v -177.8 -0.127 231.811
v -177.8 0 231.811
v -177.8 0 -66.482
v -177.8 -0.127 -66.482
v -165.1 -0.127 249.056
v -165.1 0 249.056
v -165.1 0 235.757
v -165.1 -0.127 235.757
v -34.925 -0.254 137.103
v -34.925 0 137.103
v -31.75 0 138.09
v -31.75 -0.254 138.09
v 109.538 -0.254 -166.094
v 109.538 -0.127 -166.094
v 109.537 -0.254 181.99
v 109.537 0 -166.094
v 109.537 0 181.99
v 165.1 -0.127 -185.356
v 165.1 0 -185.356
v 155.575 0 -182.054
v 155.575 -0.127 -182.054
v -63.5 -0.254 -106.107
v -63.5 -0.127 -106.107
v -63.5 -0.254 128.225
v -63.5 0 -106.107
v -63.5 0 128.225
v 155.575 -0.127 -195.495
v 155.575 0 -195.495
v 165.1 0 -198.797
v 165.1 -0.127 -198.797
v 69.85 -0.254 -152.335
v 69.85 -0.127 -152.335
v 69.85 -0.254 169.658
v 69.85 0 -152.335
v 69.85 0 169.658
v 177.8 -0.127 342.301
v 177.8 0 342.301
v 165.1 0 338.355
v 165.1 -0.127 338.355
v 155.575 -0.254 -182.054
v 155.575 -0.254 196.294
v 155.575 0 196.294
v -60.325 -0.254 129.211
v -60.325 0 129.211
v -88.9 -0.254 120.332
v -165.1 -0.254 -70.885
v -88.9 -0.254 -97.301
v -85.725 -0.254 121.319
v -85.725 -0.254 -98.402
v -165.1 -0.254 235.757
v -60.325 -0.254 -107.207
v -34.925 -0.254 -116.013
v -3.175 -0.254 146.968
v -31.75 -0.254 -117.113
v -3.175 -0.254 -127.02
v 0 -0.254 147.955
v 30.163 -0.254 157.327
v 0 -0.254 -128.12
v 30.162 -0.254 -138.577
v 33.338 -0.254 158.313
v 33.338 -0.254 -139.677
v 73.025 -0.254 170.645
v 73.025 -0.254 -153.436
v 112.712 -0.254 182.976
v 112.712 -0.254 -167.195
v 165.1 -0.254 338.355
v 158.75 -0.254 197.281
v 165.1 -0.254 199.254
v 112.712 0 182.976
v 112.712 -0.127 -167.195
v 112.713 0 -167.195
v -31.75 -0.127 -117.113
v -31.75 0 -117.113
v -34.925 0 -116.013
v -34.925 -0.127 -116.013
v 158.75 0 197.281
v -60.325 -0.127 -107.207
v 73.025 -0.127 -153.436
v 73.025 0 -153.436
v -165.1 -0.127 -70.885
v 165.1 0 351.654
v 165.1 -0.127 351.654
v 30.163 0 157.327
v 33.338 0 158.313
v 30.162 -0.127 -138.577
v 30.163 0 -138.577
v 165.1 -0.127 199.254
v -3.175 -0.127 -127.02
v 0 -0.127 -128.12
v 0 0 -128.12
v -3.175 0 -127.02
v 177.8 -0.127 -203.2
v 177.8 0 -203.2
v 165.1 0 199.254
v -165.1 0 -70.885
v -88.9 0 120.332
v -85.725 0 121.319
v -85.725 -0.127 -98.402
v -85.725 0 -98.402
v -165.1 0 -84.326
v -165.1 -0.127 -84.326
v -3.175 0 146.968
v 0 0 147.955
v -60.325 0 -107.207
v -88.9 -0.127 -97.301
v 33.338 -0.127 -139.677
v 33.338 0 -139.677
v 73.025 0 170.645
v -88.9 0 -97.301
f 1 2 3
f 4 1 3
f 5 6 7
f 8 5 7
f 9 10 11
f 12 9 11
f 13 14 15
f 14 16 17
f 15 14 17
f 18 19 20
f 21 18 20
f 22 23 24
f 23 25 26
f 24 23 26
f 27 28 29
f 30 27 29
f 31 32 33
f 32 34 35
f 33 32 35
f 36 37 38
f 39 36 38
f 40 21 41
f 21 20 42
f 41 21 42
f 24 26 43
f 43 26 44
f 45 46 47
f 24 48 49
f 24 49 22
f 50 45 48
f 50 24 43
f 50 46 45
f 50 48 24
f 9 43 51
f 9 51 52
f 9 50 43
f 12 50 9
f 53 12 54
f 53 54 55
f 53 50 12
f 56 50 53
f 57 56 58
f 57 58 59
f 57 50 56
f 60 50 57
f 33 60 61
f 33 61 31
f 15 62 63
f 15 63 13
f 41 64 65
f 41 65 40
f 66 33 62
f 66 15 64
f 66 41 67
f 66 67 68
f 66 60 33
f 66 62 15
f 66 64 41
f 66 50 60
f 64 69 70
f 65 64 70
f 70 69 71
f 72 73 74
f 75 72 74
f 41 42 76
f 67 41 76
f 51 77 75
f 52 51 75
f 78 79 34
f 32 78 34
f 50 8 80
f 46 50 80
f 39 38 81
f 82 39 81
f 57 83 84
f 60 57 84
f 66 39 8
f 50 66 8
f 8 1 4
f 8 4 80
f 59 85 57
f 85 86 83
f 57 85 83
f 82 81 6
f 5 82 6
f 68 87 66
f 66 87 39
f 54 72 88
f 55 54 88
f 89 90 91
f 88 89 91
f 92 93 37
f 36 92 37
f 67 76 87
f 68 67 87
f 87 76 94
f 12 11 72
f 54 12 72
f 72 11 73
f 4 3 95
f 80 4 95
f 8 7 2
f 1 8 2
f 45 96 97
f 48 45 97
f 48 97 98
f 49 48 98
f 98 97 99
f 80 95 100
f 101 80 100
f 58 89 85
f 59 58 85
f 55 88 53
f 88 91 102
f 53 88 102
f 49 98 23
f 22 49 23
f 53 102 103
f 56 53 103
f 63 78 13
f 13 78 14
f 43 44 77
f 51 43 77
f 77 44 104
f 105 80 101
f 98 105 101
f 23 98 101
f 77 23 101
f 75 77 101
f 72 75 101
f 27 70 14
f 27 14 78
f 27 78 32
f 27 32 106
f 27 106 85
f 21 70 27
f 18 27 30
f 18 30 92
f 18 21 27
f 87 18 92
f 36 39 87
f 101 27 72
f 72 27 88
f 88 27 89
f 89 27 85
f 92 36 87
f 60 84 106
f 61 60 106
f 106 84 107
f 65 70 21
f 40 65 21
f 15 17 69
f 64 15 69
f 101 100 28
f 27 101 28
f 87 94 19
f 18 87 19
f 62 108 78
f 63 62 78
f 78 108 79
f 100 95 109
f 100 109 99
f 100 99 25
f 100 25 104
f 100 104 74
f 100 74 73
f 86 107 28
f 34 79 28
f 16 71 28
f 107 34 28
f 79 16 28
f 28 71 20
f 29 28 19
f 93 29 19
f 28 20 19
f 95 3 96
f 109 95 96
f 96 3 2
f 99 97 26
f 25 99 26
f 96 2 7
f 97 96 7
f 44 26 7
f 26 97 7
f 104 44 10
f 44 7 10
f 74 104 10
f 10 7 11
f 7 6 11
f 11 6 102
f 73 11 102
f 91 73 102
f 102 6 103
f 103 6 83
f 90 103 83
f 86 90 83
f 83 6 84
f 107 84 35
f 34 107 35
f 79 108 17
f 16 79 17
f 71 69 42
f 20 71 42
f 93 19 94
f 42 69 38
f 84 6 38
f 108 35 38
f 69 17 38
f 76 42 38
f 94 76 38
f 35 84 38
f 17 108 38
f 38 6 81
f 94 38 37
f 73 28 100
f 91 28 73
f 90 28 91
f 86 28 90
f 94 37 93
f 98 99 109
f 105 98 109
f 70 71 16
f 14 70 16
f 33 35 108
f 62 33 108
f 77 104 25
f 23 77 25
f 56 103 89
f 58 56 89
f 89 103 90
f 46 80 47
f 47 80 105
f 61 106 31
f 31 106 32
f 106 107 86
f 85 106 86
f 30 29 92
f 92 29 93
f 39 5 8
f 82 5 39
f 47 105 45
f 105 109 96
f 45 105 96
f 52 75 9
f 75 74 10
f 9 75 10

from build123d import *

# Parameters (mm, degrees)
F1_DEPTH = 0.254
F2_DEPTH = 0.127


with BuildPart() as f1:
    # F0 (on Front) → F1 (new body)
    with BuildSketch(Plane.XZ):
        Polygon((-165.1, 96.6560714286), (-165.1, -70.8848640166), (-88.9, -97.3012268737), (-88.9, 120.3325), align=None)
        Polygon((-85.725, 121.3190178571), (-85.725, -98.4019086594), (-63.5, -106.1066811594), (-63.5, 128.2246428571), align=None)
        Polygon((-60.325, 129.2111607143), (-60.325, -107.2073629451), (-34.925, -116.0128172308), (-34.925, 137.1033035714), align=None)
        Polygon((-31.75, 138.0898214286), (-31.75, -117.1134990166), (-3.175, -127.019635088), (-3.175, 146.9684821429), align=None)
        Polygon((0, 147.955), (0, -128.1203168737), (30.1625, -138.576793838), (30.1625, 157.3269196429), align=None)
        Polygon((33.3375, -139.6774756237), (69.85, -152.3353161594), (69.85, 169.6583928571), (33.3375, 158.3134375), align=None)
        Polygon((112.7125, -167.1945202666), (155.575, -182.0537243737), (155.575, 196.294375), (112.7125, 182.9763839286), align=None)
        Polygon((73.025, -153.4359979451), (109.5375, -166.0938384808), (109.5375, 181.9898660714), (73.025, 170.6449107143), align=None)
        Polygon((-165.1, 235.7571436628), (-165.1, 96.6560714286), (-88.9, 120.3325), (-85.725, 121.3190178571), (-63.5, 128.2246428571), (-60.325, 129.2111607143), (-34.925, 137.1033035714), (-31.75, 138.0898214286), (-3.175, 146.9684821429), (0, 147.955), (30.1625, 157.3269196429), (33.3375, 158.3134375), (69.85, 169.6583928571), (73.025, 170.6449107143), (109.5375, 181.9898660714), (112.7125, 182.9763839286), (155.575, 196.294375), (158.75, 197.2808928571), (165.1, 199.2539285714), (165.1, 338.3550008057), align=None)
    extrude(amount=F1_DEPTH)

    # F0 (on Front) → F2 (join)
    with BuildSketch(Plane.XZ):
        Polygon((-177.8, 231.8110722342), (-177.8, 92.71), (-165.1, 96.6560714286), (-165.1, 235.7571436628), align=None)
        Polygon((-165.1, 249.0560714286), (-165.1, 235.7571436628), (165.1, 338.3550008057), (165.1, 351.6539285714), align=None)
        Polygon((177.8, 342.3010722342), (165.1, 338.3550008057), (165.1, 199.2539285714), (177.8, 203.2), align=None)
        Polygon((-177.8, 92.71), (-177.8, 0), (-177.8, -66.4821368737), (-165.1, -70.8848640166), (-165.1, 96.6560714286), align=None)
        Polygon((-88.9, -97.3012268737), (-165.1, -70.8848640166), (-165.1, -84.3263671429), (155.575, -195.4952275), (155.575, -182.0537243737), (112.7125, -167.1945202666), (109.5375, -166.0938384808), (73.025, -153.4359979451), (69.85, -152.3353161594), (33.3375, -139.6774756237), (30.1625, -138.576793838), (0, -128.1203168737), (-3.175, -127.019635088), (-31.75, -117.1134990166), (-34.925, -116.0128172308), (-60.325, -107.2073629451), (-63.5, -106.1066811594), (-85.725, -98.4019086594), align=None)
        Polygon((177.8, 203.2), (165.1, 199.2539285714), (165.1, -185.3557697308), (177.8, -189.7584968737), (177.8, 0), align=None)
        Polygon((155.575, -182.0537243737), (155.575, -195.4952275), (165.1, -198.7972728571), (165.1, -185.3557697308), (158.75, -183.1544061594), align=None)
        Polygon((165.1, -185.3557697308), (165.1, -198.7972728571), (177.8, -203.2), (177.8, -189.7584968737), align=None)
    extrude(amount=F2_DEPTH)


solid = f1.part
